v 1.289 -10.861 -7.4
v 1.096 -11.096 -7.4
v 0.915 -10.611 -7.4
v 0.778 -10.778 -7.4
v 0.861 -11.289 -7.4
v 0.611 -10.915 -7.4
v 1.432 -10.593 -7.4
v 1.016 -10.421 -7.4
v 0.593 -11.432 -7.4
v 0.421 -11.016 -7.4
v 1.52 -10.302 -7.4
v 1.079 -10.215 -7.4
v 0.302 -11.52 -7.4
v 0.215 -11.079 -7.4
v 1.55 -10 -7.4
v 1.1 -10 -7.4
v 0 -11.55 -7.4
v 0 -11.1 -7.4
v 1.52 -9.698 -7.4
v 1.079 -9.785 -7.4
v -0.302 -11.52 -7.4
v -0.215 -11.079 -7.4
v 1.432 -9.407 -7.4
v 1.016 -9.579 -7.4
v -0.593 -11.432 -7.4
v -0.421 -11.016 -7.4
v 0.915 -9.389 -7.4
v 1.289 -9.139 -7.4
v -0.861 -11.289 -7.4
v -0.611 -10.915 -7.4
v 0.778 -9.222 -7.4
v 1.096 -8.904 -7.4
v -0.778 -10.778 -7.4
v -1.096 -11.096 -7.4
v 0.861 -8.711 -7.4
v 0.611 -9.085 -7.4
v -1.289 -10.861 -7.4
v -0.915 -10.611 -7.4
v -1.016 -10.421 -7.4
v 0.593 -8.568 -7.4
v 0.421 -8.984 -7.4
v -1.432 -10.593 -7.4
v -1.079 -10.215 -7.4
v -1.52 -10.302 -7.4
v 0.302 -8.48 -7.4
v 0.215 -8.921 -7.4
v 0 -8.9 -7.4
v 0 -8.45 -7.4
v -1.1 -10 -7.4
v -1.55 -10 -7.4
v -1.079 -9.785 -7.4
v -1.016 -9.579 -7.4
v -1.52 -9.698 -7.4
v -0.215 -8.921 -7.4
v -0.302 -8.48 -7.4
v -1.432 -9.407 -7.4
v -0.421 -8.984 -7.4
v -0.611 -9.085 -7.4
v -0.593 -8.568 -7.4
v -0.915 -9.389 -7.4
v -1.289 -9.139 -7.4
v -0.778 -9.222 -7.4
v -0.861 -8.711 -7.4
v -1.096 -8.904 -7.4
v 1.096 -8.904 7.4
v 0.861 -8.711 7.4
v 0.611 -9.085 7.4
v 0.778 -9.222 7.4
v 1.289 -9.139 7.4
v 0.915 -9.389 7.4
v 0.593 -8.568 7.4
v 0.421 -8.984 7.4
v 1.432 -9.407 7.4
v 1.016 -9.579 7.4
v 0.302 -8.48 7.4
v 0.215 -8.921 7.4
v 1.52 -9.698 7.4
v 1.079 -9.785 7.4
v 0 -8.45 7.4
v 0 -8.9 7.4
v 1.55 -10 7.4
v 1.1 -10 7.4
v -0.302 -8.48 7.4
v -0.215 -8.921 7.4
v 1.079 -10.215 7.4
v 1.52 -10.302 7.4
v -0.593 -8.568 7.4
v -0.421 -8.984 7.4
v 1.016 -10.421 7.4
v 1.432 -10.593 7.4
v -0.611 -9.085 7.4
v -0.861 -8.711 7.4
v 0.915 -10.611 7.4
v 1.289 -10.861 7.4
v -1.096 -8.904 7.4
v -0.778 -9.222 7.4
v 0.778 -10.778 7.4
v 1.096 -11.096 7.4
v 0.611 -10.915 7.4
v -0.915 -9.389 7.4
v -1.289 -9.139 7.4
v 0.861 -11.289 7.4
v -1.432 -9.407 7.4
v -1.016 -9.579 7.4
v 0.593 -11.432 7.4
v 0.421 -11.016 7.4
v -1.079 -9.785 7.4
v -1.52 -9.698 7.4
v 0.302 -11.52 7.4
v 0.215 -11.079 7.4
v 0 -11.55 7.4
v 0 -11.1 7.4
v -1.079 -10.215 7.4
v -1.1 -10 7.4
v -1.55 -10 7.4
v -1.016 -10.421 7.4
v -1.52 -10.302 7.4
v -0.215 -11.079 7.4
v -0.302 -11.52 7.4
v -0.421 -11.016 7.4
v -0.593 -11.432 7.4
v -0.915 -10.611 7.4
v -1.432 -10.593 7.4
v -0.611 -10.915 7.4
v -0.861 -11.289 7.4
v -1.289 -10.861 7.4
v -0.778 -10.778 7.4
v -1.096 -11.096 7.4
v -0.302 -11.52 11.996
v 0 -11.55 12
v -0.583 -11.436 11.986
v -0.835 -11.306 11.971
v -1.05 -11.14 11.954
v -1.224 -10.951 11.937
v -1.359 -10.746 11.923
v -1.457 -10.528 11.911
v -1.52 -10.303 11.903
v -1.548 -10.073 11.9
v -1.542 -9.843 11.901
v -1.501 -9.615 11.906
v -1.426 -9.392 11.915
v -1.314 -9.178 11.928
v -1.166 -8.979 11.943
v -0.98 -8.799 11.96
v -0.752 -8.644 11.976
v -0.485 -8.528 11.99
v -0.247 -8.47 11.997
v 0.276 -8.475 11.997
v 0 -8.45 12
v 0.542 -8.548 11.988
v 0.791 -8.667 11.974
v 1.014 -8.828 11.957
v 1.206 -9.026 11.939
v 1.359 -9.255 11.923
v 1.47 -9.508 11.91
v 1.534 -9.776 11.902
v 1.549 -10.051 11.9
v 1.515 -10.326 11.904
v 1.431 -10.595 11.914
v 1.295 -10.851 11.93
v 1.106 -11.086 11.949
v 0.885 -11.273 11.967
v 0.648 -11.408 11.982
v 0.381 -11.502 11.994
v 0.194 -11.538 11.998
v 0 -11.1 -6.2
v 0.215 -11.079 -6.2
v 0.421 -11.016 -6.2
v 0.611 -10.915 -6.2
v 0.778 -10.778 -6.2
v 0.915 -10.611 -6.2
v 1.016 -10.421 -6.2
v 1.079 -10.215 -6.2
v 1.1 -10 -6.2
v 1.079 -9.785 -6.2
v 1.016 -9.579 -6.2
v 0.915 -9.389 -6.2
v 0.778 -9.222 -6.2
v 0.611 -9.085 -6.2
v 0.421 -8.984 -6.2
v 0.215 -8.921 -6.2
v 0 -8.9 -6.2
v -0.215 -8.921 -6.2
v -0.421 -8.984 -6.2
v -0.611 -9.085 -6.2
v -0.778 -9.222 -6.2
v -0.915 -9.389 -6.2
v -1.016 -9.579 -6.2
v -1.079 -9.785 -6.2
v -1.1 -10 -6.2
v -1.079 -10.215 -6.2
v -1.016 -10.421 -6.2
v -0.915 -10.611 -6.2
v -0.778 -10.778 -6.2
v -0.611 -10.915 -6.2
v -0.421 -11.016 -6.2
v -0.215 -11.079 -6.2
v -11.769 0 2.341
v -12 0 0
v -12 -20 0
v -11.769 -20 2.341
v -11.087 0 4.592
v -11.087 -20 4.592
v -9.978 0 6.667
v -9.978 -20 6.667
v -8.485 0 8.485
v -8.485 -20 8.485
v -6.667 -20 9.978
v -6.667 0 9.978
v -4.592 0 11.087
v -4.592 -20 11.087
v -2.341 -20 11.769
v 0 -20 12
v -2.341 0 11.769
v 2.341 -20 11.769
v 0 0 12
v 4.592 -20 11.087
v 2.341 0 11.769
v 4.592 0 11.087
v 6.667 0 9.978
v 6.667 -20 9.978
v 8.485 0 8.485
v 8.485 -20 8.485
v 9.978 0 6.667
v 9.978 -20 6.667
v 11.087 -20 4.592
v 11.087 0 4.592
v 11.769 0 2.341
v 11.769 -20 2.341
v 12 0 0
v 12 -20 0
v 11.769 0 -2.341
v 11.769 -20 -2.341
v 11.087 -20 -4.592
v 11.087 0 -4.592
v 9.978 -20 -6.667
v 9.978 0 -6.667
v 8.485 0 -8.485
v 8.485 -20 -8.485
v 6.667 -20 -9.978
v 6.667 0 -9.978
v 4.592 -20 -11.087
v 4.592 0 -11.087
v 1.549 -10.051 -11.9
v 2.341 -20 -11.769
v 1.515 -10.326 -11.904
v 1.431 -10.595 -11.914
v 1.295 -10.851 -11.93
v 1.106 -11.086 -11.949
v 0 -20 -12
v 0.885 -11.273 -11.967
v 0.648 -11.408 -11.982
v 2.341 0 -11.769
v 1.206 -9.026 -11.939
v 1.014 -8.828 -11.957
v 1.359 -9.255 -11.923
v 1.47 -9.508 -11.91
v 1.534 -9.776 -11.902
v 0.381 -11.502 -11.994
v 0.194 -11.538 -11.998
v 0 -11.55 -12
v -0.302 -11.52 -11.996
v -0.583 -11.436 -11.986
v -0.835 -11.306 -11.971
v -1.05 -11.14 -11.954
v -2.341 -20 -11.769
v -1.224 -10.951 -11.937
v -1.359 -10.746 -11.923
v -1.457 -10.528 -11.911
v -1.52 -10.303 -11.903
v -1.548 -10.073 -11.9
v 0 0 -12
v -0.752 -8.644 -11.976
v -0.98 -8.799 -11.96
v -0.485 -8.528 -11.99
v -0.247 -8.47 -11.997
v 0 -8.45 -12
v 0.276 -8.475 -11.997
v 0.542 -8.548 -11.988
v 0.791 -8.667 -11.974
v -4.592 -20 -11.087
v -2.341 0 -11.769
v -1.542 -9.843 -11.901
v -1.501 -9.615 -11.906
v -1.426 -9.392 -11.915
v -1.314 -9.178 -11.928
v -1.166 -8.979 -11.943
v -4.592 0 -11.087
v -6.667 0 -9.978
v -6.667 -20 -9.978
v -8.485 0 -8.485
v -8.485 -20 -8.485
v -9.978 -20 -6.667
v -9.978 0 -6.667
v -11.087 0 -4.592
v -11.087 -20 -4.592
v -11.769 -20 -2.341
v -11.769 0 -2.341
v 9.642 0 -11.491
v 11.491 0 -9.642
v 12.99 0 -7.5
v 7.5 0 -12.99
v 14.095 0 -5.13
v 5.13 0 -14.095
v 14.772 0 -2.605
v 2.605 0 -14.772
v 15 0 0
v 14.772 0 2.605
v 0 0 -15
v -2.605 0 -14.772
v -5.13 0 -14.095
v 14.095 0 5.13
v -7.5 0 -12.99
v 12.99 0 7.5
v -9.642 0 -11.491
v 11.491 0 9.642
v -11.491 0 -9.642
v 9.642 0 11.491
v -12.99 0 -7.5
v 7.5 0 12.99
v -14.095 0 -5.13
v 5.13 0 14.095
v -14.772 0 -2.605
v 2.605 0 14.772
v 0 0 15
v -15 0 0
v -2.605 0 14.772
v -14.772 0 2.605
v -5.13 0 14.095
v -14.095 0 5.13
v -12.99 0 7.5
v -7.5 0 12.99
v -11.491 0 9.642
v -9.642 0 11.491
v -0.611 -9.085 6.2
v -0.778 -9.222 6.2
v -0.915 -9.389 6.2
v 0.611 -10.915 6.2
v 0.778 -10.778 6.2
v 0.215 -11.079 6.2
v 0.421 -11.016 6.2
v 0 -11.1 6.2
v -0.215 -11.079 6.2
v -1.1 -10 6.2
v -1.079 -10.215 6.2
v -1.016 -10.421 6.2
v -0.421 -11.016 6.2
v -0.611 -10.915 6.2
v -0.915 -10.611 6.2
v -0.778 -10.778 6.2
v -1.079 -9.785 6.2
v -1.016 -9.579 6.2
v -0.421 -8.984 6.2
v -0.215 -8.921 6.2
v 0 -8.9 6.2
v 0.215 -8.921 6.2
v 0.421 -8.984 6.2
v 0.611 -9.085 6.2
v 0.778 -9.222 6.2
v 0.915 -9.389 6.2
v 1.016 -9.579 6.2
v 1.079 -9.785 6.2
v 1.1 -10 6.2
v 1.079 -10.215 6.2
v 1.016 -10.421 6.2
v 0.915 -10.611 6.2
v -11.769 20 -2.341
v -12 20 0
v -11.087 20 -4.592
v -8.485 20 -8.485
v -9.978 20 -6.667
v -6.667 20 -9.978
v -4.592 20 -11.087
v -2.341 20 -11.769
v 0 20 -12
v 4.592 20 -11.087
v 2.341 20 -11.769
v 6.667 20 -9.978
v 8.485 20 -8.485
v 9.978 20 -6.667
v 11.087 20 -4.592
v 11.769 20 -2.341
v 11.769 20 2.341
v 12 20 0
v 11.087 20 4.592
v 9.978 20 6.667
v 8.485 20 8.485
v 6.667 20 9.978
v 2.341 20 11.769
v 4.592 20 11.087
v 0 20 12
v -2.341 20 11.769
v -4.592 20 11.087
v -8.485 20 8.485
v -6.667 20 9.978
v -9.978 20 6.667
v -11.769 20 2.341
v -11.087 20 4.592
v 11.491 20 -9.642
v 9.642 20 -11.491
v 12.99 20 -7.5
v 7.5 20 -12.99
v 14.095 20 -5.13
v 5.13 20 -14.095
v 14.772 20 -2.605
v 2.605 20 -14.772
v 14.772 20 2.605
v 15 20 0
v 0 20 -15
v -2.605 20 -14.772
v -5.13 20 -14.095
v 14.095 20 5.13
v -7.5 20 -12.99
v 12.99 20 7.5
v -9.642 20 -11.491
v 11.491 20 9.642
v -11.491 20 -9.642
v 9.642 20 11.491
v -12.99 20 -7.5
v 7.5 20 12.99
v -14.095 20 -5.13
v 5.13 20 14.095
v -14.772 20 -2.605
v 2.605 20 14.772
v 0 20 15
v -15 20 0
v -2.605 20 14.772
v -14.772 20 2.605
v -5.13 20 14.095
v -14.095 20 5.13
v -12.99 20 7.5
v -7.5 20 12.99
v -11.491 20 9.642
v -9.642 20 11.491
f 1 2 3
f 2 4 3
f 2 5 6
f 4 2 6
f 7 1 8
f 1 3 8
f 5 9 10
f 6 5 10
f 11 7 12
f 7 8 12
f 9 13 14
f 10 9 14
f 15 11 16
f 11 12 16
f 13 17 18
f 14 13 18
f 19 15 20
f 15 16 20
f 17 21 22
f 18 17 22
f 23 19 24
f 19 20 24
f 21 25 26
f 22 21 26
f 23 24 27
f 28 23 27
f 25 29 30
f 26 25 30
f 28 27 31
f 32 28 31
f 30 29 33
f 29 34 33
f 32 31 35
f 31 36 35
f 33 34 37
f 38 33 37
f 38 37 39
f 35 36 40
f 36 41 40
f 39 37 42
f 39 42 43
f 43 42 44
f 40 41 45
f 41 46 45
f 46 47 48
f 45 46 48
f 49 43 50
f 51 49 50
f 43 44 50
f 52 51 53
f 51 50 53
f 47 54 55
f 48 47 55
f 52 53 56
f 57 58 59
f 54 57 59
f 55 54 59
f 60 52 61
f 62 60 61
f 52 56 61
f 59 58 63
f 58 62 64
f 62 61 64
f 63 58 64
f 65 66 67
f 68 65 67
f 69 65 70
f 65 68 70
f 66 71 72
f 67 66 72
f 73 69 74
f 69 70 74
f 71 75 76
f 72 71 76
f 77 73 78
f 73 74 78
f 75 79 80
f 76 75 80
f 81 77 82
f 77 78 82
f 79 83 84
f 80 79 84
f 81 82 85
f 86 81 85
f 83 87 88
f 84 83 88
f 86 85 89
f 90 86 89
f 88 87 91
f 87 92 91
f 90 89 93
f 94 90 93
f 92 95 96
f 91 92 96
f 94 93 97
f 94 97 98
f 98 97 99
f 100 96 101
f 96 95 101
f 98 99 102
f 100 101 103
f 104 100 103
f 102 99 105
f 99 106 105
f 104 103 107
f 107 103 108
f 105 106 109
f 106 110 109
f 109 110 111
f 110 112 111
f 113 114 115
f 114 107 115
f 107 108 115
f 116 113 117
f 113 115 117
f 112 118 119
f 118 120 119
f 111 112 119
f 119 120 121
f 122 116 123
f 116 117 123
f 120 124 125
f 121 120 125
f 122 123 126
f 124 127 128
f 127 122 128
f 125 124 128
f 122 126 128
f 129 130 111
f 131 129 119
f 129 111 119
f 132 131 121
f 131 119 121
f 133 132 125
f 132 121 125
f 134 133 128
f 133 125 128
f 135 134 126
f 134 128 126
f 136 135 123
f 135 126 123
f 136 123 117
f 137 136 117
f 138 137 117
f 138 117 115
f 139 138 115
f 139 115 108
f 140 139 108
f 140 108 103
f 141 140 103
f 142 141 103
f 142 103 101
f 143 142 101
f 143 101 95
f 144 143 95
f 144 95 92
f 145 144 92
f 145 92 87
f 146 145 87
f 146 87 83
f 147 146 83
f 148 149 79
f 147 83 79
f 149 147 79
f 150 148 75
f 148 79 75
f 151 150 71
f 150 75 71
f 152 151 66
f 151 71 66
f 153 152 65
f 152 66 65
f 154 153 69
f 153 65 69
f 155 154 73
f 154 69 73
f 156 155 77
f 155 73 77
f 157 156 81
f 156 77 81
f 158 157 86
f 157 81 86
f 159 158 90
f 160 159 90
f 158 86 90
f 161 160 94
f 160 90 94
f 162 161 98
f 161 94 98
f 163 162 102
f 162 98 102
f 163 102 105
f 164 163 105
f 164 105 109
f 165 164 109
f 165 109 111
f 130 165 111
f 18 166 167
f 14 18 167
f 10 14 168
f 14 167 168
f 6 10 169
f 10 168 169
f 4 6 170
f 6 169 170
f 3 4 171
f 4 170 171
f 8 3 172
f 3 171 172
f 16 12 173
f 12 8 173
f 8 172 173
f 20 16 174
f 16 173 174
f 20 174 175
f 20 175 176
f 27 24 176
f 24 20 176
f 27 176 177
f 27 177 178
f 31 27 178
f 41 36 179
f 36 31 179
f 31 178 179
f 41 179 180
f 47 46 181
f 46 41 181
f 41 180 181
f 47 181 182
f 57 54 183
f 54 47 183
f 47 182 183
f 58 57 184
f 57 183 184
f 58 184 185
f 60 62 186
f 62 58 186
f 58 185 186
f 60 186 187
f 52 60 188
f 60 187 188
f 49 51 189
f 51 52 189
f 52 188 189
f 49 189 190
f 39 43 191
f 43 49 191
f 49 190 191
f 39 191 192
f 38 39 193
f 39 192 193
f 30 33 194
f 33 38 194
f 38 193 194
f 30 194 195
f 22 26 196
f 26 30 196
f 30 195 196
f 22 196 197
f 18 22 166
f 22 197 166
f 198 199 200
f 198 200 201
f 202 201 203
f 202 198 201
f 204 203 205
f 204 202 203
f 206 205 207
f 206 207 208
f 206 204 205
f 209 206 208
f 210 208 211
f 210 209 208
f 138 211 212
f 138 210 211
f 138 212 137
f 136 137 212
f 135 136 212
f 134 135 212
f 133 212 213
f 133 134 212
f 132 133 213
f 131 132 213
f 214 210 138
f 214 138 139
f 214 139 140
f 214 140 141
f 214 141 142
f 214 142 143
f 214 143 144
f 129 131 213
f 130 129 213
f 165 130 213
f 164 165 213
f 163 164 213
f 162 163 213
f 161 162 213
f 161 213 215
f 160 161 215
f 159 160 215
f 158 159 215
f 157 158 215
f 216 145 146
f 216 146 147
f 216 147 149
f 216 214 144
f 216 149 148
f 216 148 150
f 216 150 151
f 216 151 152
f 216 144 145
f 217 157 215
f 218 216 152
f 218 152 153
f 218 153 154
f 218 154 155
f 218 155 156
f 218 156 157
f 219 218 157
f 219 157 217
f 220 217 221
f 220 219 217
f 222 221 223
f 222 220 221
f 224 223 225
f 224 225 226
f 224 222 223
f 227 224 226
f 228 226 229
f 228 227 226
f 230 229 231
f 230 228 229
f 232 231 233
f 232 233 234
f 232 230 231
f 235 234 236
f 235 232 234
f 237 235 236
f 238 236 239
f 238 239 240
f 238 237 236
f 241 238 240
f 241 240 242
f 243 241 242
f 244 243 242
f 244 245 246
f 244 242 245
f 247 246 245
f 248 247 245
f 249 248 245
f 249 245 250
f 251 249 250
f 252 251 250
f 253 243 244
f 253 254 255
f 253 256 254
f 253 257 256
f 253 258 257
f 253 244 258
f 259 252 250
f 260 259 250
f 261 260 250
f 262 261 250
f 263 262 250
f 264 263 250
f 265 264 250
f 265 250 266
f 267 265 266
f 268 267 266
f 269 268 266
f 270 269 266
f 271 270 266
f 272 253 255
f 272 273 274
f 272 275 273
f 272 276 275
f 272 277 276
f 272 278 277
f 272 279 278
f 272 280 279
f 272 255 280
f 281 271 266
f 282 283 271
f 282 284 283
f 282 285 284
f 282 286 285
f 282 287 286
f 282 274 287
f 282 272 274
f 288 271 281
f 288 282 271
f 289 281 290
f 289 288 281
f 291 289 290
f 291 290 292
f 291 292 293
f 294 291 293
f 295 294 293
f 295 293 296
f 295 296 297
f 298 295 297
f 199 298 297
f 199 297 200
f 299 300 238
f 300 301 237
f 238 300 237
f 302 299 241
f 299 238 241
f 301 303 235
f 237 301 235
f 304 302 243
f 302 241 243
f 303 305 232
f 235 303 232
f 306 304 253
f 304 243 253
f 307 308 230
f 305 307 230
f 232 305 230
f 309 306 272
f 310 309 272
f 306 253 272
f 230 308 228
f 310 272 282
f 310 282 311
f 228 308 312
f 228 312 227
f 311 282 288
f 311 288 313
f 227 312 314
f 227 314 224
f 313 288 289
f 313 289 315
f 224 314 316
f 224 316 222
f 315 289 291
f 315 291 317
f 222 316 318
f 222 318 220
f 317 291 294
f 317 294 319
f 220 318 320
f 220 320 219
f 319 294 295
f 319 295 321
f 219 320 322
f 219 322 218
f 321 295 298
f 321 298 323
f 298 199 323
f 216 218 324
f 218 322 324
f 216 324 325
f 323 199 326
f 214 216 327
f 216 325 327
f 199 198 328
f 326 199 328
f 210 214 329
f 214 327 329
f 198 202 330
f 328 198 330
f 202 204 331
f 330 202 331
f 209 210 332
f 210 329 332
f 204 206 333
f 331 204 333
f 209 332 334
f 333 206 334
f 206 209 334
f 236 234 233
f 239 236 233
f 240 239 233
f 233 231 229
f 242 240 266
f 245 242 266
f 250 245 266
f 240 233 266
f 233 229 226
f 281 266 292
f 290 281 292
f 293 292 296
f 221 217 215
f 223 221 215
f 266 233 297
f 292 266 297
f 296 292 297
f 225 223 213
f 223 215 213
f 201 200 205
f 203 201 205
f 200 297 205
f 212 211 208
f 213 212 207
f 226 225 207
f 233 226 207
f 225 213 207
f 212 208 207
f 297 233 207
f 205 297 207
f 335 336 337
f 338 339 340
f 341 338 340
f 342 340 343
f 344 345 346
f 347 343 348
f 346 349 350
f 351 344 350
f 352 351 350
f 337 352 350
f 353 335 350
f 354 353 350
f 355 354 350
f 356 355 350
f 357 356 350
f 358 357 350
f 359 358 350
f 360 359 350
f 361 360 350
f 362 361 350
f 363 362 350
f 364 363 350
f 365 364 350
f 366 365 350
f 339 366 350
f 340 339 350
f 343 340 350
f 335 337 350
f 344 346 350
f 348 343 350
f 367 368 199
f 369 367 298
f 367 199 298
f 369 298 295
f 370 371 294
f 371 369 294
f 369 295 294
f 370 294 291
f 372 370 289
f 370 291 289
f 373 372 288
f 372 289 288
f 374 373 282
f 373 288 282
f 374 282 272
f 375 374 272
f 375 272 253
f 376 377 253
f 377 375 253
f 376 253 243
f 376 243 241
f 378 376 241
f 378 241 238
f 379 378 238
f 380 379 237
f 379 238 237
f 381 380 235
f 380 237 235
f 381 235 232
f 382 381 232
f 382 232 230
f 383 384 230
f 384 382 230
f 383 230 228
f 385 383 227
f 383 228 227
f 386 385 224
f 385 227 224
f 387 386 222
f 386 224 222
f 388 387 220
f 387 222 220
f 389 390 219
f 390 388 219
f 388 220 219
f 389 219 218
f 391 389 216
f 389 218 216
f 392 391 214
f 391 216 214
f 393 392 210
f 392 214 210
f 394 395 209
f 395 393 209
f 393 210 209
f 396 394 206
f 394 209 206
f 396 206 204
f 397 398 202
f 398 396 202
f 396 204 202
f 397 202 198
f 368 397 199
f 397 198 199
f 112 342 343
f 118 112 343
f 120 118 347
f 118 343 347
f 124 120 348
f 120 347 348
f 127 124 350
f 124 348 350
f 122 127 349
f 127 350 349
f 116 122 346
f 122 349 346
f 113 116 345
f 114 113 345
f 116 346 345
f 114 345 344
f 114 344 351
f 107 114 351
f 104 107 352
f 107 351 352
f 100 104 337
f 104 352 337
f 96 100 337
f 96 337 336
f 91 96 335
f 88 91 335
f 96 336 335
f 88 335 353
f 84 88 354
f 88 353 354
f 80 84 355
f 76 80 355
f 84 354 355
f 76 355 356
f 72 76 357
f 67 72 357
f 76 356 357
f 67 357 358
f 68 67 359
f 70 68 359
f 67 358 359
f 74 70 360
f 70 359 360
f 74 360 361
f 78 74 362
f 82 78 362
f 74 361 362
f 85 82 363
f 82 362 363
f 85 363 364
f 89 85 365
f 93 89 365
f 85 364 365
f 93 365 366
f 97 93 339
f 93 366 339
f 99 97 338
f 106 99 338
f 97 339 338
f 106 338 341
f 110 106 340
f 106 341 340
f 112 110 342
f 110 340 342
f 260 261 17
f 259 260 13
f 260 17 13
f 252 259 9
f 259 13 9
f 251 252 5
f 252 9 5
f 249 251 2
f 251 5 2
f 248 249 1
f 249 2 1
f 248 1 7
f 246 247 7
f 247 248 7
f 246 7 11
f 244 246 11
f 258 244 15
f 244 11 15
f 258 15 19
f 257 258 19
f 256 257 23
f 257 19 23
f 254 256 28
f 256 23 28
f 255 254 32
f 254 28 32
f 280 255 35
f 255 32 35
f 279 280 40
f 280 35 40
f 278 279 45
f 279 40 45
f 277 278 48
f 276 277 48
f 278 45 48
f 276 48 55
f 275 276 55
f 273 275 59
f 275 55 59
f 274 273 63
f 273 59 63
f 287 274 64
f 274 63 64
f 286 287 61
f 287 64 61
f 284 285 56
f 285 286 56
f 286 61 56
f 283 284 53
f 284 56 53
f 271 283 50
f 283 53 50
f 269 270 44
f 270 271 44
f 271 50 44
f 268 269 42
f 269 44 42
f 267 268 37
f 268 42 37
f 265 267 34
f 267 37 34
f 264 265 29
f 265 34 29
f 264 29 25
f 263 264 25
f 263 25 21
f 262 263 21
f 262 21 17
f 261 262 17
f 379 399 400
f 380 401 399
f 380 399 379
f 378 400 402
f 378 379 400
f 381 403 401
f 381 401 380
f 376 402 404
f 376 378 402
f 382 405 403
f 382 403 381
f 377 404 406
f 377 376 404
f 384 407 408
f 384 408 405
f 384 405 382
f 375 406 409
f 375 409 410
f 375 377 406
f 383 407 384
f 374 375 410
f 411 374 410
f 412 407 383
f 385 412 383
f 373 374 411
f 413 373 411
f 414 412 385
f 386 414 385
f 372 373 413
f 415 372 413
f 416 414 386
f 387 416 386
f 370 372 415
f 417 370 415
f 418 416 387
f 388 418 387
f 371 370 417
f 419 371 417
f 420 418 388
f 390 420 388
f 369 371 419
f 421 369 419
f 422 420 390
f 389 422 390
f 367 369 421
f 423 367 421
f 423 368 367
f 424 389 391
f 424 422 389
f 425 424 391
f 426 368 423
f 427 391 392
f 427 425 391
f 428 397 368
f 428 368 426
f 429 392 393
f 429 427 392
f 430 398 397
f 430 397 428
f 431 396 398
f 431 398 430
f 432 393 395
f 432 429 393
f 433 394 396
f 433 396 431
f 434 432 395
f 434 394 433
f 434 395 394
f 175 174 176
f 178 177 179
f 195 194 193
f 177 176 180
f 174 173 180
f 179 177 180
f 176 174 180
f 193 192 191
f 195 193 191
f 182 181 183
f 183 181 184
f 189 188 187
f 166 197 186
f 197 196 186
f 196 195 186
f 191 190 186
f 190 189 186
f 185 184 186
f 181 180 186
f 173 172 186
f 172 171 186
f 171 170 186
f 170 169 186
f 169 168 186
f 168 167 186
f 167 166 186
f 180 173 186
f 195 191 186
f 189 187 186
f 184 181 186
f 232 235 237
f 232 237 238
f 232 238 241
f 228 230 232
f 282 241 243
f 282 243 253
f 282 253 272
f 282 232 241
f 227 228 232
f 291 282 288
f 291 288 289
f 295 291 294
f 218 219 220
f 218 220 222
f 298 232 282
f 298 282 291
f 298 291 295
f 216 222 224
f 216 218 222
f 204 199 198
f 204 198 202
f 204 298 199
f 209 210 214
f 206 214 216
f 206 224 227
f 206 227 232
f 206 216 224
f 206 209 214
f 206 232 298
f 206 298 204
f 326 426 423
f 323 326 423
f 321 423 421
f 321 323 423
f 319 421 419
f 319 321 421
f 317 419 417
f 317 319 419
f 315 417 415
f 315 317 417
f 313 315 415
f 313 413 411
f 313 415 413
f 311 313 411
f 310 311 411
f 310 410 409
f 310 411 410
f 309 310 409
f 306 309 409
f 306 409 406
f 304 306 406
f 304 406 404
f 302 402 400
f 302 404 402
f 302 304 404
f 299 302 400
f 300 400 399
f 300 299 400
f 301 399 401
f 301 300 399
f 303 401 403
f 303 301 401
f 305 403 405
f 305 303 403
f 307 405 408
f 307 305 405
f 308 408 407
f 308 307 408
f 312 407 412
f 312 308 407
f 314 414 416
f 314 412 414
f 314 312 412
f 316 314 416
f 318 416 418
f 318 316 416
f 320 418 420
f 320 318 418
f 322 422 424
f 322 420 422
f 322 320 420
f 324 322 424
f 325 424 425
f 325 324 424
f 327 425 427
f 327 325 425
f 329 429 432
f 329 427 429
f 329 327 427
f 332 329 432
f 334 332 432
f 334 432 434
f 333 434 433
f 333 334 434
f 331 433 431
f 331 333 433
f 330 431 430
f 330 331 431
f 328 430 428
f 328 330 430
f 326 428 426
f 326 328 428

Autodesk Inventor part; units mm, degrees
ref_plane "YZ Plane" through (0, 0, 0) normal (1, 0, 0) x (0, 1, 0)
ref_plane "XZ Plane" through (0, 0, 0) normal (0, 1, 0) x (-1, 0, 0)
sketch "Sketch1" plane through (0, 0, 0) normal (0, 1, 0) x (-1, 0, 0)
  circle A0 centre (0, 0) radius 12
  circle A1 centre (0, 0) radius 15
  dimension "d0" = 24
  dimension "d1" = 30
extrude "Extrusion1" add sketch "Sketch1" against normal blind 20 contours A0
extrude "Extrusion2" add sketch "Sketch1" along normal blind 20
ref_plane "Work Plane1" through (0, 0, 12) normal (0, 0, 1) x (1, 0, 0)
sketch "Sketch2" plane through (0, 0, 12) normal (0, 0, 1) x (1, 0, 0)
  line L0 (-12, -20) -> (12, -20) projected
  line L1 (0, -20) -> (0, 0)
  line L2 (0, -10) -> (-5, -10)
  dimension "d7" = 5
hole "Hole1" at (0, -10, 12) direction (0, 0, -1) diameter 2.2 depth 5.8 counterbore diameter 3.1 counterbore depth 4.6
mirror "Mirror1" about plane through (0, 0, 0) normal (0, 0, 1) of "Hole1"
properties part number "Tube_3"
